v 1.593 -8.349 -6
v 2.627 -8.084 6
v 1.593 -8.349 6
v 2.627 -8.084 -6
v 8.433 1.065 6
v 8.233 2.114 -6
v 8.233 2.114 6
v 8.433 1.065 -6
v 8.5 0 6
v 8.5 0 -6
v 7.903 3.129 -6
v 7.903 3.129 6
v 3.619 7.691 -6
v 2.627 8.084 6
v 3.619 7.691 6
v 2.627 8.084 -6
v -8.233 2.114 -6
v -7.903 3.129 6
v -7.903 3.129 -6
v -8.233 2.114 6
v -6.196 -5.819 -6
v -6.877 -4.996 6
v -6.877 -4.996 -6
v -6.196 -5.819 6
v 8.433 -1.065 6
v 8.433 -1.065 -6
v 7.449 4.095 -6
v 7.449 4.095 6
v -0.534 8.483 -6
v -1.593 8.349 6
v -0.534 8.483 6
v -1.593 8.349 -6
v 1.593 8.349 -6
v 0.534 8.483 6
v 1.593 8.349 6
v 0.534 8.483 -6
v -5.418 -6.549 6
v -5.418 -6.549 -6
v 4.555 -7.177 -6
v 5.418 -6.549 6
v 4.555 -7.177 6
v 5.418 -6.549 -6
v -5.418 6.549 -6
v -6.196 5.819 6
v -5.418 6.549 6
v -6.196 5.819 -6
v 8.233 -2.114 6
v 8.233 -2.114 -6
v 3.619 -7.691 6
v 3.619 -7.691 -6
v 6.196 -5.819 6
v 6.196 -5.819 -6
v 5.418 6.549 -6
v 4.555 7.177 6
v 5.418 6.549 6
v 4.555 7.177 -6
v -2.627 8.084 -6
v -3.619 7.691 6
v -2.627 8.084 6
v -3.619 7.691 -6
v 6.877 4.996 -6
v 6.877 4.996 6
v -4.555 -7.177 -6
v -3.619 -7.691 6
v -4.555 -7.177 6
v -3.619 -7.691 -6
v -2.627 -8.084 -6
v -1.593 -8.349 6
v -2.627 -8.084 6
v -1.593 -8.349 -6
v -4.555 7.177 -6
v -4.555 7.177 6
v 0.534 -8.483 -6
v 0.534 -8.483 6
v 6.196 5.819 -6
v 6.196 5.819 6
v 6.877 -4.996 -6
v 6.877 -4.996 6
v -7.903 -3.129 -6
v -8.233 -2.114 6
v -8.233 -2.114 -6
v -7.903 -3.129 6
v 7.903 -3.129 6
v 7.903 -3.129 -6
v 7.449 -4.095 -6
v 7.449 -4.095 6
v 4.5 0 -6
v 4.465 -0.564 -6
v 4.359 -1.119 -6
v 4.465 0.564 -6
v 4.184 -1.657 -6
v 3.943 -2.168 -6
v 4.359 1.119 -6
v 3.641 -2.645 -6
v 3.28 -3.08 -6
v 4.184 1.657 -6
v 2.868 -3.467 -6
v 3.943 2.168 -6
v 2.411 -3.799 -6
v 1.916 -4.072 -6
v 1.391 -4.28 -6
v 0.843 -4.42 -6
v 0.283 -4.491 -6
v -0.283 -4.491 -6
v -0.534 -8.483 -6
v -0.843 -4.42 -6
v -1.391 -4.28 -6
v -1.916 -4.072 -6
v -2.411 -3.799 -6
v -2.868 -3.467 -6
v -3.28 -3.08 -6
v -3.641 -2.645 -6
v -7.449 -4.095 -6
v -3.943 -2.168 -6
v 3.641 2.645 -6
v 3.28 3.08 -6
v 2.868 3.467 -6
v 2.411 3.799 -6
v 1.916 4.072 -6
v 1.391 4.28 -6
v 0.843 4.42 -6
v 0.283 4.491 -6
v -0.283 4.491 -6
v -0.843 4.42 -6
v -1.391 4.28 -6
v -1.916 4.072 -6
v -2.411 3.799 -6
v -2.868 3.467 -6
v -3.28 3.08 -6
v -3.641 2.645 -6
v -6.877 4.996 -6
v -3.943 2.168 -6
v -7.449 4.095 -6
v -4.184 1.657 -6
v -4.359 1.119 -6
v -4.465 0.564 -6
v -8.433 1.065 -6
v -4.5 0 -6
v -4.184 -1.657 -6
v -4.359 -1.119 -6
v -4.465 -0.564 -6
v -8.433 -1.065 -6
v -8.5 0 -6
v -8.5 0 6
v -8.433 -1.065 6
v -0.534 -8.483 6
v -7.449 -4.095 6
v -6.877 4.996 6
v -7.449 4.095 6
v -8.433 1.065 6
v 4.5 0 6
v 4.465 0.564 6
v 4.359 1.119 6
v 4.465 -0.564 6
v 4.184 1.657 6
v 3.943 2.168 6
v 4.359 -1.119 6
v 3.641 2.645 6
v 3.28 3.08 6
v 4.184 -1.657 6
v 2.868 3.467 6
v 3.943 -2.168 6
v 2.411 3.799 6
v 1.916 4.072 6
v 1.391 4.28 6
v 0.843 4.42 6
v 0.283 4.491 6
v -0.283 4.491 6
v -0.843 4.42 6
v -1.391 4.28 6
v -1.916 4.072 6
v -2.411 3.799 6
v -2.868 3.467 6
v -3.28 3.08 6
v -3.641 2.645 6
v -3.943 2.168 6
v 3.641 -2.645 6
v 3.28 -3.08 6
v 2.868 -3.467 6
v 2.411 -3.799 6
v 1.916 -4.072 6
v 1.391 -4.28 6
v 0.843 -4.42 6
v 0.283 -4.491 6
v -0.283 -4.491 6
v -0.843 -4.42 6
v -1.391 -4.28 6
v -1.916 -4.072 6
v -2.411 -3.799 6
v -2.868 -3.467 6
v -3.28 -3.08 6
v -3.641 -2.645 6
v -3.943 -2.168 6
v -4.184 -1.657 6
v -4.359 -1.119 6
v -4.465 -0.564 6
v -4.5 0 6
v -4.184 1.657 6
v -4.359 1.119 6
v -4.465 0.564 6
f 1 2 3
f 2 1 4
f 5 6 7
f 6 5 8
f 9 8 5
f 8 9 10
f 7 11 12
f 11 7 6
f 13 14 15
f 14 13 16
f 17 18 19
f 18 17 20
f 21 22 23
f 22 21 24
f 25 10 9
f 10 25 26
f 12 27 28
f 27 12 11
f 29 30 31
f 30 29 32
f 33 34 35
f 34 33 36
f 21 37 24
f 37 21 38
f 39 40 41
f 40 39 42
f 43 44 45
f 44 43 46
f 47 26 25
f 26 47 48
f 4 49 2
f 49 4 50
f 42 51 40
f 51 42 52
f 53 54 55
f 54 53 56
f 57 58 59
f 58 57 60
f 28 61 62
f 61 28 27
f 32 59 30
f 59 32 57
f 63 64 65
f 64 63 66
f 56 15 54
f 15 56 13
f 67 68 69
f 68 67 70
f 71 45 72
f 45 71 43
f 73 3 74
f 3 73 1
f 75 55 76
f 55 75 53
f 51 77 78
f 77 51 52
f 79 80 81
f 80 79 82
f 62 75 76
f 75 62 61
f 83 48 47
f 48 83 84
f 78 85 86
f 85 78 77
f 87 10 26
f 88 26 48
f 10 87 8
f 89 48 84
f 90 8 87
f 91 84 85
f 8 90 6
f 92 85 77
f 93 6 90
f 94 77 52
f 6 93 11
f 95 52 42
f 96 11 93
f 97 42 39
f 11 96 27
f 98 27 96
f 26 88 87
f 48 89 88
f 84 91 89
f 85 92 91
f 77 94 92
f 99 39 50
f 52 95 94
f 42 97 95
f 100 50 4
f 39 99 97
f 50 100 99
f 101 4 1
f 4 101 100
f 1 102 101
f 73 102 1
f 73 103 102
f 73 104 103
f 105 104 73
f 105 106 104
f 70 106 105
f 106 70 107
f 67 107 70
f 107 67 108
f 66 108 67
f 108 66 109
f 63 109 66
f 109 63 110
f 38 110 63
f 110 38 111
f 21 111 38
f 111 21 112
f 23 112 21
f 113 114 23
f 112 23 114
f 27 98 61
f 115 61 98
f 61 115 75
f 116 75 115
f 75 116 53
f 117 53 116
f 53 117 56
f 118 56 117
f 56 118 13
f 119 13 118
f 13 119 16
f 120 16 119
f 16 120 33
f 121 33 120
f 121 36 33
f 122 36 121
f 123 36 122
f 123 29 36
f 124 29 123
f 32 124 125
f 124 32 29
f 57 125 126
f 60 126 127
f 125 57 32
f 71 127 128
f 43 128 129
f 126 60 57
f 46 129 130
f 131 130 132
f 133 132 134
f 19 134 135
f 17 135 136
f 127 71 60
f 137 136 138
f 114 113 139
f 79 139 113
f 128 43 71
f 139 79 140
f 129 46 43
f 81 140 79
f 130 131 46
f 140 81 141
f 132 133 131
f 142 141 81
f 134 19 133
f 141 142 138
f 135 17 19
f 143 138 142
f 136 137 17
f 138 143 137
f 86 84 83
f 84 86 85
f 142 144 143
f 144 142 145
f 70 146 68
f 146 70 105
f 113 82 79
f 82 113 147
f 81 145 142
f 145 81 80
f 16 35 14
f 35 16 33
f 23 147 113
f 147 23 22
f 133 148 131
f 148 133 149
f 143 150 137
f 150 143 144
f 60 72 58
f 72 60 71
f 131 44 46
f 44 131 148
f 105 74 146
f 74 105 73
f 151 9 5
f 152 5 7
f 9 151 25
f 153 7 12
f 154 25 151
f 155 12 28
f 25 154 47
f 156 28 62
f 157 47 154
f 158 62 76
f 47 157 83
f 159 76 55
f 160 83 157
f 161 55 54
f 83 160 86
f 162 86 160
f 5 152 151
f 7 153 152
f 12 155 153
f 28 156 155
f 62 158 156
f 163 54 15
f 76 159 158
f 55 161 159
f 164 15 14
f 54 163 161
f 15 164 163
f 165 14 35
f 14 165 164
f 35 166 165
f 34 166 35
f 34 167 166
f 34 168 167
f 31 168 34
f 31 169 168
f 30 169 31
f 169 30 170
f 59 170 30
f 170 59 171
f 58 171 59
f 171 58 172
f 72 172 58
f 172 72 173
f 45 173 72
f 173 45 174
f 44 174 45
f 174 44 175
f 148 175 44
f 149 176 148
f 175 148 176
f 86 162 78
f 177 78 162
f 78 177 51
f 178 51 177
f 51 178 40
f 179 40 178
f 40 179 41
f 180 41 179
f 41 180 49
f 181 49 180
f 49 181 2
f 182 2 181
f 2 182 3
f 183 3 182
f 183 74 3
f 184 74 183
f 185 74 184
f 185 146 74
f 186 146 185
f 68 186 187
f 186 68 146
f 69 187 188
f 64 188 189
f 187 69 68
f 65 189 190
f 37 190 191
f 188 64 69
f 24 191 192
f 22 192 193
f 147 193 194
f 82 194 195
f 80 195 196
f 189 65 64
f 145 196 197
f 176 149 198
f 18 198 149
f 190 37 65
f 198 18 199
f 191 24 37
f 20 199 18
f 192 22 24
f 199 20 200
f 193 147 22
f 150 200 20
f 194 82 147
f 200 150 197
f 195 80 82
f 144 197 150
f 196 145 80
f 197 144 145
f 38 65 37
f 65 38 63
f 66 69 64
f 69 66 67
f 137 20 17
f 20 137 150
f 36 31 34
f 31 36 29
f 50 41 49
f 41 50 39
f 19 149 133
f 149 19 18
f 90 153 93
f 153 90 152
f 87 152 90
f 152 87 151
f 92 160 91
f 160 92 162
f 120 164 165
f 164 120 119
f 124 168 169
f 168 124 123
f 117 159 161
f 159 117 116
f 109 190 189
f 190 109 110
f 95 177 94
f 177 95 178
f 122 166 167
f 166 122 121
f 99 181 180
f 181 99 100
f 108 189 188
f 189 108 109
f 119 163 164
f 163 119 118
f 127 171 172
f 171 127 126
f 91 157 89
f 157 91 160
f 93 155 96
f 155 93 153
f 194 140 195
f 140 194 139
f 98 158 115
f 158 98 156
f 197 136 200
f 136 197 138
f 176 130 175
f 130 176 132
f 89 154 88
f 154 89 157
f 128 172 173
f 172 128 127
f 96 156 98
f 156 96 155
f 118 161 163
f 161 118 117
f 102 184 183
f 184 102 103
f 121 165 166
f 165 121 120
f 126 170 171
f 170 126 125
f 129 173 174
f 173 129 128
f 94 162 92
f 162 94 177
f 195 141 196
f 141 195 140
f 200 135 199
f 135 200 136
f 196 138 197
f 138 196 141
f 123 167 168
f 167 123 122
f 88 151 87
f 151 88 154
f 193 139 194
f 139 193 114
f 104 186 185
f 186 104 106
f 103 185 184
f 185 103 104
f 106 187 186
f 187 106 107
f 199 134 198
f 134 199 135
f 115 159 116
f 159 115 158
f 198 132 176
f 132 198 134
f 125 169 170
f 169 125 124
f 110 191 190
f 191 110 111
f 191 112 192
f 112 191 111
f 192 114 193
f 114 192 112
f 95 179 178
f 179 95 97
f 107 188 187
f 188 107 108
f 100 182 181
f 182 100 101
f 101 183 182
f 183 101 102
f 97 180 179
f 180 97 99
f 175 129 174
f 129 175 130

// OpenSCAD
$fn = 50;


difference() {
	union() {
		translate(v = [0, 0, -6.0000000000]) {
			cylinder(h = 12, r = 8.5000000000);
		}
	}
	union() {
		translate(v = [0, 0, -100.0000000000]) {
			cylinder(h = 200, r = 4.5000000000);
		}
	}
}
